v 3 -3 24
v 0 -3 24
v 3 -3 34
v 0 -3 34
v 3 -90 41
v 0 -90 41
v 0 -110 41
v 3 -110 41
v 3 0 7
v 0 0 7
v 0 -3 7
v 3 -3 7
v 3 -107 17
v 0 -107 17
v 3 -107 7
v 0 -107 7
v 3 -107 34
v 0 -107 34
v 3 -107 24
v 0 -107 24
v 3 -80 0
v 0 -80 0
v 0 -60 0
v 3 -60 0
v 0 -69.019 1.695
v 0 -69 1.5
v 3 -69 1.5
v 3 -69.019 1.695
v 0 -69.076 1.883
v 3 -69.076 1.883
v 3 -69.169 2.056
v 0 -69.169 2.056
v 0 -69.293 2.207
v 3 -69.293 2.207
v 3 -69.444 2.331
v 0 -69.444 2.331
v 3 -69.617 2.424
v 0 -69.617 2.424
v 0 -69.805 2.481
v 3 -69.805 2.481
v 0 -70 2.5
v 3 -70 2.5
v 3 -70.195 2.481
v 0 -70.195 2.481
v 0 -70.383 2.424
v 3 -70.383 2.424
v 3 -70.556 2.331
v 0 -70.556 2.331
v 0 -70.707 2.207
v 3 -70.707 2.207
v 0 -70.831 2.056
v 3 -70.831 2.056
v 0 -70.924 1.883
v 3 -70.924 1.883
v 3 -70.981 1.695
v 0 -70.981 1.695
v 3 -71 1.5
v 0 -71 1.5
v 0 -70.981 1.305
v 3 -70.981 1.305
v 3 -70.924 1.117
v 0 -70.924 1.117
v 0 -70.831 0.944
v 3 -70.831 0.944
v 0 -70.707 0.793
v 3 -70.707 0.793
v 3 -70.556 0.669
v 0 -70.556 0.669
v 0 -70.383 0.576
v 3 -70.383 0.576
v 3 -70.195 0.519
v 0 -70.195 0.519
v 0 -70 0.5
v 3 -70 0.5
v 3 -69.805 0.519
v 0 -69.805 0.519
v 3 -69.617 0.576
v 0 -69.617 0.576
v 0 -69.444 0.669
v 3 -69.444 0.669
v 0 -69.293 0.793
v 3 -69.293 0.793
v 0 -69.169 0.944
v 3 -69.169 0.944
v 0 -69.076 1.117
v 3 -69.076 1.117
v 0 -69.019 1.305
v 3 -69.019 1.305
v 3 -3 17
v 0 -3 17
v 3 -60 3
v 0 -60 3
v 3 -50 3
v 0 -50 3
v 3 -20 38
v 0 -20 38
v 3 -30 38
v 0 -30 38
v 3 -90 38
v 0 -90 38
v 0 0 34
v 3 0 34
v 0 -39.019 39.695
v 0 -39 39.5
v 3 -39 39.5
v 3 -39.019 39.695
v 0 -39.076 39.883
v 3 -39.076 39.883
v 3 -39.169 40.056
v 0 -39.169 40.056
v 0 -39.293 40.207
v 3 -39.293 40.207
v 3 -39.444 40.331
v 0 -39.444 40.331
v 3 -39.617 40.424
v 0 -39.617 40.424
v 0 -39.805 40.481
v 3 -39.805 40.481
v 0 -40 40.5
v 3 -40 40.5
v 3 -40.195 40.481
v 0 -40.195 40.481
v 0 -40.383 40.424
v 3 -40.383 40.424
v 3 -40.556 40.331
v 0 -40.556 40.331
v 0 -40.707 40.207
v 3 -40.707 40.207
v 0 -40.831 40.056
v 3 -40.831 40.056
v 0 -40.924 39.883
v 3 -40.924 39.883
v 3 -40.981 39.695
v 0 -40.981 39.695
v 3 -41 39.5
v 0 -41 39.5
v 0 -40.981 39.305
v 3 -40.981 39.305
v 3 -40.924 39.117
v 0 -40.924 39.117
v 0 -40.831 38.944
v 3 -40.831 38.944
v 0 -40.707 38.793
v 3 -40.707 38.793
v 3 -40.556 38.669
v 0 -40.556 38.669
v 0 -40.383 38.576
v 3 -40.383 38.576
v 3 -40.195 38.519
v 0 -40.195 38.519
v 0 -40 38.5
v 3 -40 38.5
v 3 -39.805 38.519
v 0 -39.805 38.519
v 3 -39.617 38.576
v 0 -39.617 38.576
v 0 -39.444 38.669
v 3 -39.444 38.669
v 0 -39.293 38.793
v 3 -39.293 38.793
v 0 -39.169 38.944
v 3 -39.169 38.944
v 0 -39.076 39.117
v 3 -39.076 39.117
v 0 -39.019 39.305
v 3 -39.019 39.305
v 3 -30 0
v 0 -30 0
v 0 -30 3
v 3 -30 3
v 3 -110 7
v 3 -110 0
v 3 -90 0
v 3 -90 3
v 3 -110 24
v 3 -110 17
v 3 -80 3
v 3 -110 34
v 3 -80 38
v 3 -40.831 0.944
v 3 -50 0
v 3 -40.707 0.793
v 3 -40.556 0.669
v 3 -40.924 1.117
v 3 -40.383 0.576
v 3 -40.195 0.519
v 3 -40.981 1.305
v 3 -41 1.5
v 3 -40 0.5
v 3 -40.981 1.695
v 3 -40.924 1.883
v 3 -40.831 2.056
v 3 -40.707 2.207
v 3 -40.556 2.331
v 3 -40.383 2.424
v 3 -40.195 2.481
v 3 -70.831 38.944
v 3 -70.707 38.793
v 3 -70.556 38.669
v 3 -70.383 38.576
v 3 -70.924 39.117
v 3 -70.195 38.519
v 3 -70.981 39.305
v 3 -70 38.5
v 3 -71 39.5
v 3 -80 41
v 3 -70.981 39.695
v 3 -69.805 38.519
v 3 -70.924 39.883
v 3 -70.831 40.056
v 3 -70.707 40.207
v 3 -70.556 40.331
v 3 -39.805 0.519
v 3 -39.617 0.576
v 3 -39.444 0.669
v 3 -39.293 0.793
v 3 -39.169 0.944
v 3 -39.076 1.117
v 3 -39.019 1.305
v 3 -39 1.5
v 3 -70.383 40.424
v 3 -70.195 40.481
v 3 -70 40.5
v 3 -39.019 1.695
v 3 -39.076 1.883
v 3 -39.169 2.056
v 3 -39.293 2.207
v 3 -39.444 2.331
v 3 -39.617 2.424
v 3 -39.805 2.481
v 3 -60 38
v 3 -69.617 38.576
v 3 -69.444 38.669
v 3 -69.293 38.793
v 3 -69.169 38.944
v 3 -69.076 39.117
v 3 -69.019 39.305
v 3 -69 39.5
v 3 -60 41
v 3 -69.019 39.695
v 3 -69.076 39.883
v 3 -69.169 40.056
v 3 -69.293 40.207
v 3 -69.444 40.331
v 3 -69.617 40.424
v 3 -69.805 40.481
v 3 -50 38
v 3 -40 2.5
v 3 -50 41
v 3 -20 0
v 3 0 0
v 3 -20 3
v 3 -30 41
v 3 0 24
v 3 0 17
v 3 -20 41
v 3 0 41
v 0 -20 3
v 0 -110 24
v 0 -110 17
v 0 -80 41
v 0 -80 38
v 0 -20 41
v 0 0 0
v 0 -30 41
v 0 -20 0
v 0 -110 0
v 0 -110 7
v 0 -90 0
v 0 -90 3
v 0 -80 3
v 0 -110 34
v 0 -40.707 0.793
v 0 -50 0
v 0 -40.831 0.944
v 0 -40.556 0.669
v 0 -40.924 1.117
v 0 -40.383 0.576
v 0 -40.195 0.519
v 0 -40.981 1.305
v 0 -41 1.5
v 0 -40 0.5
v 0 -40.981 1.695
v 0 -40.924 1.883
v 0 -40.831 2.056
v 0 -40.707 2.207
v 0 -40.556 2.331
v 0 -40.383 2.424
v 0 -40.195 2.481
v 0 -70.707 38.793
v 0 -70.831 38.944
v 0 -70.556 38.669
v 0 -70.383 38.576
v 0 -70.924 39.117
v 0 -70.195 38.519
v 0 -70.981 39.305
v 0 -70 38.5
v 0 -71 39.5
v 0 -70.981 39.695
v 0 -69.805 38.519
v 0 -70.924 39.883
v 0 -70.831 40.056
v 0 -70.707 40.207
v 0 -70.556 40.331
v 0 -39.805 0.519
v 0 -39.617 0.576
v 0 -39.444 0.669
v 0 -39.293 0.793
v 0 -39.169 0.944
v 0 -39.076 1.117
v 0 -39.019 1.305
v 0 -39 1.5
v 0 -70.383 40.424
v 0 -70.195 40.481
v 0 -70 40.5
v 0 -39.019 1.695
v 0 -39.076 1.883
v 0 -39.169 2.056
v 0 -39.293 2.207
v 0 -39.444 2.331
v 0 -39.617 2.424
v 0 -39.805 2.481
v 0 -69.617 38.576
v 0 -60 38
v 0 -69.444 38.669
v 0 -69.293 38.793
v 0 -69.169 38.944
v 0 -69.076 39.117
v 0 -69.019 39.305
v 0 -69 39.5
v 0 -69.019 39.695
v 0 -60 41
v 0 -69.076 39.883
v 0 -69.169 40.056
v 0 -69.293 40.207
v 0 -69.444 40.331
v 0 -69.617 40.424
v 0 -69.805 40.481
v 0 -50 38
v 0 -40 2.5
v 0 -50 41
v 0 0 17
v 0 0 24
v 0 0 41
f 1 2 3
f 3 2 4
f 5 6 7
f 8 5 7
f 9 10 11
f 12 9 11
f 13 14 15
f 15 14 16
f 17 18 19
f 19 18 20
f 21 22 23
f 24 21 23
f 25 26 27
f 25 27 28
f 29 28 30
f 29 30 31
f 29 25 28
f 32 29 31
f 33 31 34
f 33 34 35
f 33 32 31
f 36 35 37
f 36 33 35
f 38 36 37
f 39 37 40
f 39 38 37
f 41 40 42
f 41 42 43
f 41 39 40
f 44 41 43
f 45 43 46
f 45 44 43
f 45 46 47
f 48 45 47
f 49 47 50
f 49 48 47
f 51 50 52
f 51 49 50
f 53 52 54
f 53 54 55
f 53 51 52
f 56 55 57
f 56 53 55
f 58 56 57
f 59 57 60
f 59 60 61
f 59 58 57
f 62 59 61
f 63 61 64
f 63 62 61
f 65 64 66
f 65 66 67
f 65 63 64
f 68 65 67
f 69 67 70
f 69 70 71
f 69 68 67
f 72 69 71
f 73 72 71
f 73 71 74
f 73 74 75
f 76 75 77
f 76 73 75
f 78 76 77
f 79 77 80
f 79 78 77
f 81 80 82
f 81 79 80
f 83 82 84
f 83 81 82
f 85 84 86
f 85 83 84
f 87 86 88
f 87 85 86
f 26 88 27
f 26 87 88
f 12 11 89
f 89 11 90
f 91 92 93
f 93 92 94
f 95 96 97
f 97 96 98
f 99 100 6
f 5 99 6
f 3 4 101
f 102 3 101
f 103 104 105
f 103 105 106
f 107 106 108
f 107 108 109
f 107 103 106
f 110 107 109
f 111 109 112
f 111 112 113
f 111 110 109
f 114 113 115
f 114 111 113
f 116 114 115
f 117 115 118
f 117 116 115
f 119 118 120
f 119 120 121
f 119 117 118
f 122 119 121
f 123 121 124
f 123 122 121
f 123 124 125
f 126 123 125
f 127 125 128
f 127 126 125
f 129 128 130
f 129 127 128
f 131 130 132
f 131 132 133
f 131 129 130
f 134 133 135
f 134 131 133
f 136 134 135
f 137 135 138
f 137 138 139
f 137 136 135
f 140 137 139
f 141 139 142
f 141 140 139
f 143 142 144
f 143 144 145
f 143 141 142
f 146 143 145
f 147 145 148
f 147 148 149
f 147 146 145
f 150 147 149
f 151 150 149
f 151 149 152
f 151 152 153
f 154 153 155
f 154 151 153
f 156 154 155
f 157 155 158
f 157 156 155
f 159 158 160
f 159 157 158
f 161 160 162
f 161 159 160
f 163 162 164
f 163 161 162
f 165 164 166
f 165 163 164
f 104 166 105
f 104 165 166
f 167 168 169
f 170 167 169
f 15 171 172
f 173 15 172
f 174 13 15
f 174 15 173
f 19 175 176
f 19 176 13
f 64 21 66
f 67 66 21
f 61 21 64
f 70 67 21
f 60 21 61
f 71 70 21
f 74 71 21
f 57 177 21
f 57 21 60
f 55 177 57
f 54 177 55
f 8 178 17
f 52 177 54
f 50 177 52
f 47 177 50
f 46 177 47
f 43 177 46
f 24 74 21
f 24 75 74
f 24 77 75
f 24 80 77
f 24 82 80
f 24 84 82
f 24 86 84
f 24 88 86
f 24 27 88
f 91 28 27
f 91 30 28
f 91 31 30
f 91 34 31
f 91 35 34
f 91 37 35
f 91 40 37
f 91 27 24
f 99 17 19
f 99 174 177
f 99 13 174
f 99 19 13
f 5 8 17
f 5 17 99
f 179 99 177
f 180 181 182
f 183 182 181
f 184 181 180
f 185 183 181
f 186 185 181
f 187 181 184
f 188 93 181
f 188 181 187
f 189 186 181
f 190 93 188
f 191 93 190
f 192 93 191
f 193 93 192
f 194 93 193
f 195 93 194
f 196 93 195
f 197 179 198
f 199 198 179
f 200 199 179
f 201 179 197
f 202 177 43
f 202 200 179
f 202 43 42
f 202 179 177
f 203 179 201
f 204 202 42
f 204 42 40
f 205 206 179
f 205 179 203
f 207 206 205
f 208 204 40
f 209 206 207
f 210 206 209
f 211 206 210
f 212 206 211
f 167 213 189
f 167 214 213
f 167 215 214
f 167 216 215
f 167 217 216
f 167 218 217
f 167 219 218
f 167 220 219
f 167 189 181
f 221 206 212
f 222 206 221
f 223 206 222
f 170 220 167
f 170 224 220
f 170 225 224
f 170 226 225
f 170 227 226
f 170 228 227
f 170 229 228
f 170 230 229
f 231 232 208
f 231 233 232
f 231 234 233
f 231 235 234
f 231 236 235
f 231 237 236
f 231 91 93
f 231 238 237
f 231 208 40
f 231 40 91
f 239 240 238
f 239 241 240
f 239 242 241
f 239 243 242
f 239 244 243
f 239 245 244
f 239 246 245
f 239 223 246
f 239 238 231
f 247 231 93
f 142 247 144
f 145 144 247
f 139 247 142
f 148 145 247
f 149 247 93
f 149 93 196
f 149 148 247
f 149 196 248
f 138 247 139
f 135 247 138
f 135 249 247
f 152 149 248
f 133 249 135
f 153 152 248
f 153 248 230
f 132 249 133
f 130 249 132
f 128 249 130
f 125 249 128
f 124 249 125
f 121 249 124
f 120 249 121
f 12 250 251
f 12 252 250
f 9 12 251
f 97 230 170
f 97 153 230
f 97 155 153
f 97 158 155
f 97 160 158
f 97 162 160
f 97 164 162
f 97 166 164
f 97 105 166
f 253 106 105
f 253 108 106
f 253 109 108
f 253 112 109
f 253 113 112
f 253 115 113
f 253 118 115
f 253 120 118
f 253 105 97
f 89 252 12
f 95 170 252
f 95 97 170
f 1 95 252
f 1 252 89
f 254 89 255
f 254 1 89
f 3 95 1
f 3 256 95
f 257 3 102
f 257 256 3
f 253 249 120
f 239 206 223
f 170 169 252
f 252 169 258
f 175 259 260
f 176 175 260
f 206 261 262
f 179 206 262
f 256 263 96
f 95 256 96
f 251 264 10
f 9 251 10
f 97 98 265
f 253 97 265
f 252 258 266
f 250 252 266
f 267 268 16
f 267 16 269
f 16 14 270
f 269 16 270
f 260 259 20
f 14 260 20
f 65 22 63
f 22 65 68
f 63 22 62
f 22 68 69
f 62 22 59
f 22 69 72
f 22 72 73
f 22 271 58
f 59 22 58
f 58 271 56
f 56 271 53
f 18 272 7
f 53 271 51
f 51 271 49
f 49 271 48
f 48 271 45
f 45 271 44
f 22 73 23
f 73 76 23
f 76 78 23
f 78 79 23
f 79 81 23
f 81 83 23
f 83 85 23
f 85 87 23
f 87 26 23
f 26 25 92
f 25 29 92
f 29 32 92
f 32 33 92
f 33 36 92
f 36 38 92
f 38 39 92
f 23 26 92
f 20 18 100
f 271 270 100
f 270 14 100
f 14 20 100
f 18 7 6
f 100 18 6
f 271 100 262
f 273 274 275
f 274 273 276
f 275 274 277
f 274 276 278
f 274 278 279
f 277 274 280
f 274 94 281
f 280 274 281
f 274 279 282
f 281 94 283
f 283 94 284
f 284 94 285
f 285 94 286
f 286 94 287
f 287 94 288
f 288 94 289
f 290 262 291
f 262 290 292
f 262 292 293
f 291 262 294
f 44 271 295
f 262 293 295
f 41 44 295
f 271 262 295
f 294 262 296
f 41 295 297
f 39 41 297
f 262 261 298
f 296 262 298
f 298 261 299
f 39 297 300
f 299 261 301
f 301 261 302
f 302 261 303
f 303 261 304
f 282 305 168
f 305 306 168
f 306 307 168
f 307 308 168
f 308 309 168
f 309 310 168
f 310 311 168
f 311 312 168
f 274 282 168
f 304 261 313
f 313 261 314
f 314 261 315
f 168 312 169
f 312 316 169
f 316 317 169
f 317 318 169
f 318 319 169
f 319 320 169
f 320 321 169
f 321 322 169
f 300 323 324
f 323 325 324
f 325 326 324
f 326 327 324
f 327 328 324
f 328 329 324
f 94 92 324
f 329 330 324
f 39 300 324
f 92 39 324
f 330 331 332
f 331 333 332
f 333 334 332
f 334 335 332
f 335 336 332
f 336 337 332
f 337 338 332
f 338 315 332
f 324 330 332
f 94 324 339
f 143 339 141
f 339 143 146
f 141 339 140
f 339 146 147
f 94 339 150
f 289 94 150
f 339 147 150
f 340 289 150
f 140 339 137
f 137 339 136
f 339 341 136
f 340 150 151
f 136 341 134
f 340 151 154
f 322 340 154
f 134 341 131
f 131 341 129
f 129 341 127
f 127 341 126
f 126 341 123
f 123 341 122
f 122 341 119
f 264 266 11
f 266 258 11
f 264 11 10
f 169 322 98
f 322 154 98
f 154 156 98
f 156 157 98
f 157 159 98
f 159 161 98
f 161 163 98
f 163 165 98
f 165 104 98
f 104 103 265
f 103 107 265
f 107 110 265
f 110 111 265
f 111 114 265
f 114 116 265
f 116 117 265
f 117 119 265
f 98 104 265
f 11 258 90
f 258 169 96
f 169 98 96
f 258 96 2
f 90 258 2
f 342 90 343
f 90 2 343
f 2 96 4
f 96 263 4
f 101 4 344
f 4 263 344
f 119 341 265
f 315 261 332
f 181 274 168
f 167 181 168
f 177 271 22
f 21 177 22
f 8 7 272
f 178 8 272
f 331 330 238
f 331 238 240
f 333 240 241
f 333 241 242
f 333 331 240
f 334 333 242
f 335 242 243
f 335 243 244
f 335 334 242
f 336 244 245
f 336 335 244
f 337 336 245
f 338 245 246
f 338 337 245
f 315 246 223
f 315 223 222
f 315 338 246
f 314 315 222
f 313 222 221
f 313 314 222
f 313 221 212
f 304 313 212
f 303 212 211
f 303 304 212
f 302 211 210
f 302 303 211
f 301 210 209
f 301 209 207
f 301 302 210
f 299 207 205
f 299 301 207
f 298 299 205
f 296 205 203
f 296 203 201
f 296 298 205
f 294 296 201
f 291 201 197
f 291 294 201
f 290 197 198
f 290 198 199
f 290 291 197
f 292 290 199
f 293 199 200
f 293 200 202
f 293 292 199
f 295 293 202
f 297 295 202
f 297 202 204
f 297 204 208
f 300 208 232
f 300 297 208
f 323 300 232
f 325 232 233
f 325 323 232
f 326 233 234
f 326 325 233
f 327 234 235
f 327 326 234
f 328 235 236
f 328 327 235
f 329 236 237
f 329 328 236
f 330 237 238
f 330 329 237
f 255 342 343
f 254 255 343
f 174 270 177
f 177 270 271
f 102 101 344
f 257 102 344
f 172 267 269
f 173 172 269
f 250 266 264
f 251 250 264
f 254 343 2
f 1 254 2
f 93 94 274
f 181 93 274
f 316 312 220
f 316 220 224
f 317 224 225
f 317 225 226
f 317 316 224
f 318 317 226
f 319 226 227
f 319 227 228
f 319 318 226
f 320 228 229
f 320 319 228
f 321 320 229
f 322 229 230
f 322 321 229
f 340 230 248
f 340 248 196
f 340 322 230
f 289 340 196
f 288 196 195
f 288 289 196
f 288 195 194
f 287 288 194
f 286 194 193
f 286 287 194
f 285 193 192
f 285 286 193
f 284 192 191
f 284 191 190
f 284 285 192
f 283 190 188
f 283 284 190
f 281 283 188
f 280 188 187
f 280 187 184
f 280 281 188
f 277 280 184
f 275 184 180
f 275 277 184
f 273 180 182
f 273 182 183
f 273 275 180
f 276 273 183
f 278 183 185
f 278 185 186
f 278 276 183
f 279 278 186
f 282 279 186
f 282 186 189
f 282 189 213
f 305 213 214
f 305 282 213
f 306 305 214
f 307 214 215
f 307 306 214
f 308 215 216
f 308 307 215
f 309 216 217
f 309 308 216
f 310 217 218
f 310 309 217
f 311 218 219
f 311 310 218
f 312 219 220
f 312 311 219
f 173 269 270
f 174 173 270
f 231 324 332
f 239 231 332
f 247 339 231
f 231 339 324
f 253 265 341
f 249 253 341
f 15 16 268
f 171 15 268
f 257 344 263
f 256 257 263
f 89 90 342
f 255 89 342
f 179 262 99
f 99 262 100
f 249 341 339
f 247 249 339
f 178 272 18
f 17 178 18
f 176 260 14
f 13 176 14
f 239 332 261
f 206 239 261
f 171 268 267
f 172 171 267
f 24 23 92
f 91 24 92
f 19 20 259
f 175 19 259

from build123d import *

# Parameters (mm, degrees)
F0_R     = 1
F1_DEPTH = 3


with BuildPart() as f1:
    # F0 (on Right) → F1 (new body)
    with BuildSketch(Plane.YZ):
        Polygon((-20, 0), (0, 0), (0, 7), (-3, 7), (-3, 17), (0, 17), (0, 24), (-3, 24), (-3, 34), (0, 34), (0, 41), (-20, 41), (-20, 38), (-30, 38), (-30, 41), (-50, 41), (-50, 38), (-55, 38), (-60, 38), (-60, 41), (-80, 41), (-80, 38), (-90, 38), (-90, 41), (-110, 41), (-110, 34), (-107, 34), (-107, 24), (-110, 24), (-110, 17), (-107, 17), (-107, 7), (-110, 7), (-110, 0), (-90, 0), (-90, 3), (-80, 3), (-80, 0), (-60, 0), (-60, 3), (-55, 3), (-50, 3), (-50, 0), (-30, 0), (-30, 3), (-20, 3), align=None)
        with Locations((-70, 1.5)):
            Circle(F0_R, mode=Mode.SUBTRACT)
        with Locations((-40, 1.5)):
            Circle(F0_R, mode=Mode.SUBTRACT)
        with Locations((-70, 39.5)):
            Circle(F0_R, mode=Mode.SUBTRACT)
        with Locations((-40, 39.5)):
            Circle(F0_R, mode=Mode.SUBTRACT)
    extrude(amount=F1_DEPTH)


solid = f1.part
